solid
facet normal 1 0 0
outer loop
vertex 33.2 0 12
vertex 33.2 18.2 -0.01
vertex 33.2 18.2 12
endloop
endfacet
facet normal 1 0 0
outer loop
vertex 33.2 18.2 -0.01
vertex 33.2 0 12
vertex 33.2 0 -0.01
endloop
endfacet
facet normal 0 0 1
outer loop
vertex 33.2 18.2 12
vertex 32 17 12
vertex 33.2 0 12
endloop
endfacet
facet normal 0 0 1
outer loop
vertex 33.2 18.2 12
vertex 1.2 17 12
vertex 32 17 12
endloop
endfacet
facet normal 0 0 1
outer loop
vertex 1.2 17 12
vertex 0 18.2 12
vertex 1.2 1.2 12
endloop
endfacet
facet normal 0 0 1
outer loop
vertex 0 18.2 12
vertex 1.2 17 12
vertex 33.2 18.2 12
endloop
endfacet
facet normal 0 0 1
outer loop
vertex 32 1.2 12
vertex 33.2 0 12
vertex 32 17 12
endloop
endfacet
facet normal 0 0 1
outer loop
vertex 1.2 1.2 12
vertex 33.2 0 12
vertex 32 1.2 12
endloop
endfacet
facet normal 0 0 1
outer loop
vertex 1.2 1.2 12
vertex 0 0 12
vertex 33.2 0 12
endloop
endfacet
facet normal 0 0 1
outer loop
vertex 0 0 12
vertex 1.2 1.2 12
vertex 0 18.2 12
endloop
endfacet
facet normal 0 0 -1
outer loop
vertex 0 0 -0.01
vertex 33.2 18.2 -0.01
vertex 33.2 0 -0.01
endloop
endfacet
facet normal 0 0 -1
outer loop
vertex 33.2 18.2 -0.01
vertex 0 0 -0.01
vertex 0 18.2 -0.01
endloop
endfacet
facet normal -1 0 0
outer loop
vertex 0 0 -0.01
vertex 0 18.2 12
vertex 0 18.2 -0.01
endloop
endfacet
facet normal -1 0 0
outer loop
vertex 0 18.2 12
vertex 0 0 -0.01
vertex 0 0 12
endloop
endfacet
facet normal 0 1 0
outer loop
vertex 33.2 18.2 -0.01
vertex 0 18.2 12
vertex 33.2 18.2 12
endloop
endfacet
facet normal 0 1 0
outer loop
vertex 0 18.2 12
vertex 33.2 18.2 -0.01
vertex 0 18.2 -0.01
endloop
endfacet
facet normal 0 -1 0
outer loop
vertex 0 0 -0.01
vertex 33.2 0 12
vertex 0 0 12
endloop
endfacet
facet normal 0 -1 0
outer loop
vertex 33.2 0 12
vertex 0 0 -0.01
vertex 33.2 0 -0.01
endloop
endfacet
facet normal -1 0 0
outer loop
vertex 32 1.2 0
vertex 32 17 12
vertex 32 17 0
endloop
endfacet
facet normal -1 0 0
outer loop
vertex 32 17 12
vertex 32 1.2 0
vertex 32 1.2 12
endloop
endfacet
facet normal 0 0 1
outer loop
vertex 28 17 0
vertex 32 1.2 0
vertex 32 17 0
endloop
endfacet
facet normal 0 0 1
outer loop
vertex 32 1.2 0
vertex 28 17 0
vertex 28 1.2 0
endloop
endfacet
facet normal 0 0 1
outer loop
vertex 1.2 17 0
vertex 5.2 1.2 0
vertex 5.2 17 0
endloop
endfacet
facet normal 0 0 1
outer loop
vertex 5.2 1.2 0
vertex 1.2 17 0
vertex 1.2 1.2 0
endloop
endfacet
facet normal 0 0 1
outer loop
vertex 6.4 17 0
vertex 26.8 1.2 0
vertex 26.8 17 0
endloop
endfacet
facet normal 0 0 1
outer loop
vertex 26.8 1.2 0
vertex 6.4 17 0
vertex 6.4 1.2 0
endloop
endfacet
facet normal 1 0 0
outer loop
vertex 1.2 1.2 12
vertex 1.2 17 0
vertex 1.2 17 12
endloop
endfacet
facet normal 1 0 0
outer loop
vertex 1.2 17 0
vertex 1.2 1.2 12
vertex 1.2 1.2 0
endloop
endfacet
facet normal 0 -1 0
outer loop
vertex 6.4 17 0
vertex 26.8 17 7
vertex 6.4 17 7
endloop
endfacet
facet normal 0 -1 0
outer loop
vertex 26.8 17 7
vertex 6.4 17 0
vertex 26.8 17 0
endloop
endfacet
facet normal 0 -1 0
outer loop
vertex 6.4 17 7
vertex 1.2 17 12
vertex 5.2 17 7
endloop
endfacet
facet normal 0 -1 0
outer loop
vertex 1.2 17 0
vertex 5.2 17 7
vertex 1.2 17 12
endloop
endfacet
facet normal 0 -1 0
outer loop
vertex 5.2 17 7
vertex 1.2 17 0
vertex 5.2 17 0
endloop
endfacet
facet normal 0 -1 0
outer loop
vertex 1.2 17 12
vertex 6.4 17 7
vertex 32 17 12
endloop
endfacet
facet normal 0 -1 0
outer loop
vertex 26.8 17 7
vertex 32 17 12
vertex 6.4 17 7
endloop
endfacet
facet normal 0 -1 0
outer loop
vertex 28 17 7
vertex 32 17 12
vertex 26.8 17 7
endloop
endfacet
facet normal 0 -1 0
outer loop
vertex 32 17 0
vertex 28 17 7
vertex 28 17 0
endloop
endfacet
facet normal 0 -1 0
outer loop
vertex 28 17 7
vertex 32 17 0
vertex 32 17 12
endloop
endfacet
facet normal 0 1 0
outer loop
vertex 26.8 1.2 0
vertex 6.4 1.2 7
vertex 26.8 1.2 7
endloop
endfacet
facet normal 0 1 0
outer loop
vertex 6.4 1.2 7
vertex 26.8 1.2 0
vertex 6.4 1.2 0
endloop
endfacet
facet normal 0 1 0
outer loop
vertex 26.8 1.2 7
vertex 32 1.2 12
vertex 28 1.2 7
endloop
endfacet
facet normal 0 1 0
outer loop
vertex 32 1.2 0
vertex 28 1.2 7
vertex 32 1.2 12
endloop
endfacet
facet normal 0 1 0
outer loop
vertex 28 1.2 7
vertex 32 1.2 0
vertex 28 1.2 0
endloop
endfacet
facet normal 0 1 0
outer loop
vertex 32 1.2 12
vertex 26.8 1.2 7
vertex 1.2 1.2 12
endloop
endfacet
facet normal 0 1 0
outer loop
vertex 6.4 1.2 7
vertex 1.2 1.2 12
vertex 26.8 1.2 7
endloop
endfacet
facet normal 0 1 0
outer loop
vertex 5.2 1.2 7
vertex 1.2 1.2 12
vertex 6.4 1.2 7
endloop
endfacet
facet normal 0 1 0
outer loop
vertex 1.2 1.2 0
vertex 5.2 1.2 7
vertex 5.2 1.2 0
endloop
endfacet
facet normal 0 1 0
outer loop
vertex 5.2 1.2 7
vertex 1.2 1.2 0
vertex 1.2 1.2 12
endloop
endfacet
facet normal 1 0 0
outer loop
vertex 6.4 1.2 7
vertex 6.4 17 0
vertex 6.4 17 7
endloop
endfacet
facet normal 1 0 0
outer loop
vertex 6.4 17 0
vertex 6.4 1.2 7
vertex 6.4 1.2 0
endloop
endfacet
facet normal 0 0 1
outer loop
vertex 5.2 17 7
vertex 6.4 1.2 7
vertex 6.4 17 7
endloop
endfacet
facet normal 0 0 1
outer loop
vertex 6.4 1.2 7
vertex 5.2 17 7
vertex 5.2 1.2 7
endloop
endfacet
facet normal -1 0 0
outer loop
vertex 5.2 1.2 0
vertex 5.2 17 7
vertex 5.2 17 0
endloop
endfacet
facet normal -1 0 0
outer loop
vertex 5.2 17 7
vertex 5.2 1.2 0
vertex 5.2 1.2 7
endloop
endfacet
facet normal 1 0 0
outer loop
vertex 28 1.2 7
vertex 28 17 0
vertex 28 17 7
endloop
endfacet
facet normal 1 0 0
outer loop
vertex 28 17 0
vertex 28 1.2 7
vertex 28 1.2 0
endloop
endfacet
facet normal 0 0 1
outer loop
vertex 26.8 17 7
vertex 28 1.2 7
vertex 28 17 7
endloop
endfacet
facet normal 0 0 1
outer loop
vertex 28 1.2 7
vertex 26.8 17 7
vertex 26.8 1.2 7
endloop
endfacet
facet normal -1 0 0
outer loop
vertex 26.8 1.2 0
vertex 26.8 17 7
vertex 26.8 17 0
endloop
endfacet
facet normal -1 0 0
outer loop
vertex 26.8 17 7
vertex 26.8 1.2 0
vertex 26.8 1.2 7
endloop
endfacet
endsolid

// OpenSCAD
// file: ../Base/Rotation.scad
// Fischertechnik Box Foundation
// Geometry Helpers Rotation

include <PlacementOptions.scad>

// getRotatedSpace(space, rotation=NoRotation)
// Rotates the space dependent on the specified rotation

function getRotatedSpace(space, rotation=NoRotation) = [
    (rotation == Rotate90 || rotation == Rotate270) ? space.y : space.x,
    (rotation == Rotate90 || rotation == Rotate270) ? space.x : space.y
];

// Rotates the given space around the fixed left lower corner
// space = the space the children needs as width/depth list [width,depth]
// rotation = 0 Rotate0 degrees, 1 Rotate90 degrees, 2 Rotate180 degrees, 3 Rotate270 degrees (equivalent to -90)

module RotateFix(space, rotation=NoRotation) {
    dy = (rotation == Rotate0 || rotation == Rotate270) ? 0 :
        (rotation == Rotate90) ? space.x :
        space.y;
    dx = (rotation < Rotate180) ? 0 :
        (rotation == Rotate180) ? space.x :
        space.y;
    
    translate([dx, dy, 0])
        rotate([0, 0, rotations[rotation]])
            children();
}
// file: ../Base/Alignment.scad
// Fischertechnik Box Foundation
// Geometry Helpers Alignment

include <PlacementOptions.scad>

// getAlignedX(elementWidth, spaceWidth, align=AlignRight, offset=0)
// Gets the aligned X offset of an element with the given
// width in the given space.
// elementWidth = The width of the element to positon
// spaceWidth = The space where the element should be aligned
// align = 0 AlignLeft, 1 AlignCenter, 2 AlignRight
// offset = an optional offset from the aligned position. When
// aligned left or centered, then positive values are in X direction.
// When aligned right then positive values are in negative X direction.

function getAlignedX(elementWidth, spaceWidth, align=AlignRight, offset=0) =
    (align == AlignLeft) ?
        offset :
        ((align == AlignCenter) ?
        (spaceWidth - elementWidth)/2 + offset :
        spaceWidth - offset - elementWidth);

// getAlignedY(elementDepth, spaceDepth, align=AlignTop, offset=0)
// Gets the aligned Y offset of an element with the given
// depth in the given space.
// elementDepth = The depth of the element to positon
// spaceDepth = The space where the element should be aligned
// align = 0 AlignBottom, 1 AlignCenter, 2 AlignTop
// offset = an optional offset from the aligned position. When
// aligned bottom or centered, then positive values are in Y direction.
// When aligned top then positive values are in negative Y direction.

function getAlignedY(elementDepth, spaceDepth, align=AlignTop, offset=0) =
    (align == AlignBottom) ?
        offset :
        ((align == AlignCenter) ?
        (spaceDepth - elementDepth)/2 + offset :
        spaceDepth - offset - elementDepth);
// file: ../Base/PlacementOptions.scad
// Fischertechnik Box Foundation
// Placement Options

// Alignment
NoAlign = 0;
AlignLeft = 1;
AlignBottom = 2;
AlignCenter = 3;
AlignRight = 4;
AlignTop = 5;

// Element rotation degree steps
rotations = [0, -90, -180, -270];

// Rotation
NoRotation = 0;
Rotate0 = 0;
Rotate90 = 1;
Rotate180 = 2;
Rotate270 = 3;

// Docking (seen from above)
NoDock = -1;
DockLeft = 0;
DockTop = 1;
DockRight = 2;
DockCorner = 2;
DockBottom = 3;

// Web corners
LowerLeft = 0;
UpperLeft = 1;
UpperRight = 2;
LowerRight = 3;

// Web position relative to corner
LeftOfCorner = 0;
RightOfCorner = 1;
// file: ../Base/Boxes.scad
// Fischertechnik Box Foundation
// Pre-designed Boxes

use <Constants.scad>

include <PlacementOptions.scad>

box190Width = 190;
box190Depth = 130;
box130Width = 130;
box130Depth = 95;

// Values are from an original ec3 box
topBottomDifference = 1.5;
outerHeight = 40;
baseThickness = 1.8;
innerHeight = outerHeight - baseThickness;
stackExcess = 5.7;
radius = 3.5;
wallThickness = 1.5;
tolerance = 0.2;

boxWallThickness = wallThickness;
boxBaseThickness = baseThickness;
boxWebWidth = 3.0;

// getBoxWallThickness()
// Gets the wall thickness of a Fischertechnik Box
function getBoxWallThickness() = boxWallThickness;

// getBoxUsageHeight(height = 38.2)
// Gets the usable height of a Fischertechnik box
// height = Outer height of the box from the bottom to the upper edge.
function getBoxUsageHeight(height = outerHeight) = height - baseThickness - stackExcess;

// getBoxInnerHeight()
// Gets the inner height of a Fischertechnik box, including the stack excess
function getBoxInnerHeight() = innerHeight;

// getBoxBaseThickness()
// Gets the thickness of the Fischertechnik box base.
function getBoxBaseThickness() = boxBaseThickness;

// getBoxWebWidth()
// Gets the width of a box web
function getBoxWebWidth() = boxWebWidth;

// getBox190Space()
// Gets the usable inner space of a Box 190 as an x/y-list
function getBox190Space() = [
    box190Width - 2*getBoxWallThickness() - topBottomDifference, 
    box190Depth - 2*getBoxWallThickness() - topBottomDifference ];

// RoundedCornerPlate(width, depth, height, radius)
// Creates a body plate with rounded corners for a box. Used
// also to create the complete box with the hull module.
// width = Width of the plate
// depth = depth of the plate 
// height = thickness of the plate
// radius = radius of the rounded corner
module RoundedCornerPlate(width, depth, height, radius) {
    translate([radius, radius])
    hull() {
        w = width-2*radius;
        d = depth-2*radius;
        cube([w, d, height]);
        cylinder(height, r=radius, $fn=getFragments());
        translate([w, 0])
            cylinder(height, r=radius, $fn=getFragments());
        translate([w, d])
            cylinder(height, r=radius, $fn=getFragments());
        translate([0, d])
            cylinder(height, r=radius, $fn=getFragments());
    }
}

// BoxBase(width, depth)
// Creates an empty stackable Fischertechnik compatible box
// width = Outer width of the box (190, 130, ...)
// depth = Outer depth of the box (130, 95, ...)

module BoxBase(width, depth, height=outerHeight) {    
    thinPlate = 0.01;

    innerHeight = height - baseThickness;    
    
    module Body(tolerance=tolerance) {
        hull() {
            // Bottom with tolerance to fit into the original boxes when stacked
            translate([-wallThickness+tolerance, -wallThickness+tolerance, -baseThickness])
                RoundedCornerPlate(width-topBottomDifference-2*tolerance, depth-topBottomDifference-2*tolerance, thinPlate, radius);
            
            // Top
            translate([-wallThickness-topBottomDifference/2, -wallThickness-topBottomDifference/2, innerHeight-thinPlate])
                RoundedCornerPlate(width, depth, thinPlate, radius);
         }
    }

    module Cutoff() {
        hull() {
            coWidth = width - 2*wallThickness;
            coDepth = depth - 2*wallThickness;
            
            // Bottom
            RoundedCornerPlate(coWidth-topBottomDifference, coDepth-topBottomDifference, thinPlate, radius);

            // Top
            translate([-topBottomDifference/2, -topBottomDifference/2, innerHeight+thinPlate]) 
                RoundedCornerPlate(coWidth, coDepth, thinPlate, radius);
        }
    }
    
    difference() {        
        Body();
        Cutoff();
        stackOffset = innerHeight - stackExcess;
        translate([0, 0, stackOffset + baseThickness])
            Body(tolerance=0);
    }
}

// Creates the Fischertechnik empty box 130x190 mm and places it at position 0,0
// 190x130 are the outer sizes, the inner space is slightly smaller. Use getBox190Space() to get the inner sizes.
// The box is positioned that the usable inner space is at the 0,0,0 position.

module Box190() {
    BoxBase(box190Width, box190Depth);
}

// Gets the usable inner space of a Box 130 as an x/y-list
function getBox130Space() = [
    box130Width - 2*getBoxWallThickness() - topBottomDifference, 
    box130Depth - 2*getBoxWallThickness() - topBottomDifference ];

// Creates the Fischertechnik empty box 95x130 mm and places it at position 0,0
// 190x130 are the outer sizes, the inner space is slightly smaller. Use getBox190Space() to get the inner sizes.
// The box is positioned that the usable inner space is at the 0,0,0 position.

module Box130() {
    BoxBase(box130Width, box130Depth);
}

// Creates a web at the specified box walls
// corner 0 = LowerLeft, 1 = UpperLeft, 2 = UpperRight, 3 = LowerRight
// side 0 = LeftOfCorner, 1 = RightOfCorner
// distance = Distance in mm from the corner
// boxSpace = inner width and depth of the box (default: Box 190)
// webWidth = length of the web (default is 3 mms)
// webThickness = thickness of the web (default is 1 mm)
// height = Height of the web (standard is getBoxUsageHeight())
// sink = How much of the web is sunk into the wall

module BoxWeb(
    corner, 
    side, 
    distance, 
    boxSpace=getBox190Space(), 
    webWidth=getBoxWebWidth(), 
    webThickness=1.0, 
    height=getBoxUsageHeight(),
    sink = getBoxWallThickness()/2) {
    width = (corner % 2 == 0) ? 
            (side == LeftOfCorner ? webWidth : webThickness) :
            (side == LeftOfCorner ? webThickness : webWidth);

    depth = (corner % 2 == 0) ? 
            (side == RightOfCorner ? webWidth : webThickness) :
            (side == RightOfCorner ? webThickness : webWidth);
    
    xDiff = corner == LowerLeft ? 
                (side == LeftOfCorner ? -sink : distance) :
            (corner == UpperLeft ?                
                (side == LeftOfCorner ? distance : -sink) :
            (corner == UpperRight ?
                (side == LeftOfCorner ? boxSpace.x-webWidth+sink : boxSpace.x-distance-webThickness) :
                (side == LeftOfCorner ? boxSpace.x-distance-webThickness: boxSpace.x-webWidth+sink)));

    yDiff = corner == LowerLeft ? 
                (side == RightOfCorner ? -sink : distance) :
            (corner == UpperLeft ?
                (side == RightOfCorner ? boxSpace.y-distance-webThickness : boxSpace.y-webWidth+sink) :
            (corner == UpperRight ?
                (side == RightOfCorner ? boxSpace.y-webWidth+sink : boxSpace.y-distance-webThickness) :
                (side == RightOfCorner ? distance : -sink)));
    
    translate([xDiff, yDiff, -getExcess()])
        cube([width, depth, height + 2*getExcess()]);
}
// file: ../Base/Placement.scad
// Fischertechnik Box Foundation
// Geometry Helpers Placement

use <Constants.scad>
use <Alignment.scad>
use <Rotation.scad>
use <Boxes.scad>

include <PlacementOptions.scad>

// Place(x=0, y=0, elementSpace=[0,0], alignX=AlignLeft, alignY=AlignBottom, rotation=Rotate0, boxSpace=getBox190Space())
// Places the child at the specified position
// y = Y-Position. This is a relative position when an X aligment is specified.
// x = X-Position. This is a relative position when an Y aligment is specified.
// elementSpace = space of the element to be placed [x,y]
// alignX = -1=NoAlign, 0 AlignLeft, 1 AlignCenter, 3 AlignRight (elementSpace and boxSpace required!)
// alignY = -1=NoAlign, 2 AlignBottom, 1 AlignCenter, 4 AlignTop (elementSpace and boxSpace required!)
// rotation = 0 Rotate0 0 degrees, 1 Rotate90 90 degrees, 
// 2 Rotate180 180 degrees, 3 Rotate270 270 degrees (equivalent to -90)
// boxSpace = Inner space of the box where the placement occurs [x,y] - default is Box 190x130 inner space

module Place(x=0, y=0, elementSpace=[0,0], 
  alignX=AlignLeft, alignY=AlignBottom, 
  rotation=NoRotation, boxSpace=getBox190Space()) {

    module Position(x, y, space, rotation=Rotate0) {
        translate([x, y, 0])
            RotateFix(space, rotation)
                children();
    }

    space = getRotatedSpace(elementSpace, rotation);
    alignedX = getAlignedX(space.x, boxSpace.x, alignX, x);
    alignedY = getAlignedY(space.y, boxSpace.y, alignY, y);
    Position(alignedX, alignedY, elementSpace, rotation)
        children();
}

// Center(space=getBox130Space(), elementSpace=[0,0])
// space = Space where the children is centered. For cylinder use centered=true and no elementSpace.
// elementSpace = space of the element to be centered [x,y]

module Center(space=getBox190Space(), elementSpace=[0,0]) {
    Place(elementSpace=elementSpace, boxSpace=space, alignX=AlignCenter, alignY=AlignCenter)
        children();
}

// CenterHorizontal(width=0, y=0, offset=0, space=getBox130Space())
// width = Width of the element to be placed.
// y = Y position of the element
// offset = Offset from the center position (negative will be left of the center)
// space = Space where the element is placed

module CenterHorizontal(width=0, y=0, offset=0, space=getBox190Space()) {
    Place(x=offset, y=y, elementSpace=[width, 0], boxSpace=space, alignX=AlignCenter)
        children(0);
}

// CenterVertical(depth=0, x=0, offset=0, space=getBox130Space())
// depth = Depth of the element to be placed.
// x = X position of the element
// offset = Offset from the center position (negative will be down of the center)
// space = Space where the element is placed

module CenterVertical(depth=0, x=0, offset=0, space=getBox190Space()) {
    Place(x=x, y=offset, elementSpace=[0, depth], boxSpace=space, alignY=AlignCenter)
        children(0);
}

// getIsVertical(align)
// True if the specified alignment needs a vertical orientation for a divider (AlignRight, AlignLeft)

function getIsVertical(align) = (align == AlignRight || align == AlignLeft);

// getIsHorizontal(align)
// True if the specified alignment needs a horizontal orientation for a divider (AlignTop, AlignBottom)

function getIsHorizontal(align) = (align == AlignTop || align == AlignBottom);
// file: ../Base/Constants.scad
// Fischertechnik Box Foundation
// Constants

// Constant values necessary for multiple elements

// Base constants
dividerThickness = 1.2;
excess = 0.01;
fragments = 90;
tolerance = 0.8;

// Gets the thickness of a divider 
function getDividerThickness() = dividerThickness;

// Gets the excess that is used to merge walls into each other
function getExcess() = excess;

// Gets amount of fragments of a cylinder
function getFragments() = fragments;

// Gets the inner tolerance of a frame to each side
function getTolerance() = tolerance;


// Fischertechnik specific constants
axisDiameter = 4;
axisBottomDiameter = axisDiameter + 1;
axisTolerance = 0.2;

// Gets axis diameter of Fischertechnik axis
function getAxisDiameter() = axisDiameter;

// Gets axis diameter tolerance (subtracted for element axis)
function getAxisTolerance() = axisTolerance;

// Gets the axis diameter for standing axis
function getStandAxisDiameter() = getAxisDiameter() - getAxisTolerance();

// Gets axis bottom diameter for thicker part at the bottom
function getAxisBottomDiameter() = axisBottomDiameter;

pinHeight = 2.5;

// gets the height of a connecting pin
function getPinHeight() = pinHeight;

standardEdgeDistance = 2.5;
standardWebDistance = 11.5;
standardCornerLength = 15;

// gets the standard distance to the wall of the box for dockable frames with webs
function getStandardEdgeDistance() = standardEdgeDistance;

// gets the standard distance of each web to the corner of the dockable frame
function getStandardWebDistance() = standardWebDistance;

// gets the standard length of the corner walls of a dockable frame
function getStandardCornerLength() = standardCornerLength;

tubeWallFactor = 0.8;

// gets the wall thickness of a tube.
function getTubeWallThickness() = tubeWallFactor * getDividerThickness();

smallPartsFrameHeight = 20;

// gets the frame height for docked small parts boxes.
function getSmallPartsFrameHeight() = smallPartsFrameHeight;

hubRingDiameter = 19.5;
hubRingLevelDiameter = 21;

// gets the diameter of a tube matching the inner ring of a wheel
function getHubRingDiameter() = hubRingDiameter;

// gets the diameter of a hub tube with a thicker diameter
function getHubRingLevelDiameter() = hubRingLevelDiameter;
// main file
// Fischertechnik Box Library
// Frame for a swivel base for mini-motor
// 31070

use <../Base/Constants.scad>
use <../ModelBase/Simple.scad>

/* [Hidden] */
width = 30;
depth = 15;
height = 12;
volume = [width, depth, height];

// getFrameSwivelBaseForMiniMotorSpace()
// Gets the space of a frame for a swivel base for mini-motor 

function getFrameSwivelBaseForMiniMotorSpace() = getFrameOuterVolume(volume);

// FrameSwivelBaseForMiniMotor()
// frame for for a swivel base for mini-motor

module FrameSwivelBaseForMiniMotor() {
    Frame([width, depth, height]);

    webHeight = 7;
    webVolume = [getDividerThickness(), getFrameInnerVolume(volume).y + 2*getExcess(), webHeight];

    translate([0, getDividerThickness() - getExcess()]) {
        distance = 4;
        translate([getDividerThickness() + distance, 0])
            Wall(webVolume);
        translate([getFrameSwivelBaseForMiniMotorSpace().x - 2*getDividerThickness() - distance, 0])
            Wall(webVolume);
    }
}

// Tests
color("lightgray")
FrameSwivelBaseForMiniMotor();
